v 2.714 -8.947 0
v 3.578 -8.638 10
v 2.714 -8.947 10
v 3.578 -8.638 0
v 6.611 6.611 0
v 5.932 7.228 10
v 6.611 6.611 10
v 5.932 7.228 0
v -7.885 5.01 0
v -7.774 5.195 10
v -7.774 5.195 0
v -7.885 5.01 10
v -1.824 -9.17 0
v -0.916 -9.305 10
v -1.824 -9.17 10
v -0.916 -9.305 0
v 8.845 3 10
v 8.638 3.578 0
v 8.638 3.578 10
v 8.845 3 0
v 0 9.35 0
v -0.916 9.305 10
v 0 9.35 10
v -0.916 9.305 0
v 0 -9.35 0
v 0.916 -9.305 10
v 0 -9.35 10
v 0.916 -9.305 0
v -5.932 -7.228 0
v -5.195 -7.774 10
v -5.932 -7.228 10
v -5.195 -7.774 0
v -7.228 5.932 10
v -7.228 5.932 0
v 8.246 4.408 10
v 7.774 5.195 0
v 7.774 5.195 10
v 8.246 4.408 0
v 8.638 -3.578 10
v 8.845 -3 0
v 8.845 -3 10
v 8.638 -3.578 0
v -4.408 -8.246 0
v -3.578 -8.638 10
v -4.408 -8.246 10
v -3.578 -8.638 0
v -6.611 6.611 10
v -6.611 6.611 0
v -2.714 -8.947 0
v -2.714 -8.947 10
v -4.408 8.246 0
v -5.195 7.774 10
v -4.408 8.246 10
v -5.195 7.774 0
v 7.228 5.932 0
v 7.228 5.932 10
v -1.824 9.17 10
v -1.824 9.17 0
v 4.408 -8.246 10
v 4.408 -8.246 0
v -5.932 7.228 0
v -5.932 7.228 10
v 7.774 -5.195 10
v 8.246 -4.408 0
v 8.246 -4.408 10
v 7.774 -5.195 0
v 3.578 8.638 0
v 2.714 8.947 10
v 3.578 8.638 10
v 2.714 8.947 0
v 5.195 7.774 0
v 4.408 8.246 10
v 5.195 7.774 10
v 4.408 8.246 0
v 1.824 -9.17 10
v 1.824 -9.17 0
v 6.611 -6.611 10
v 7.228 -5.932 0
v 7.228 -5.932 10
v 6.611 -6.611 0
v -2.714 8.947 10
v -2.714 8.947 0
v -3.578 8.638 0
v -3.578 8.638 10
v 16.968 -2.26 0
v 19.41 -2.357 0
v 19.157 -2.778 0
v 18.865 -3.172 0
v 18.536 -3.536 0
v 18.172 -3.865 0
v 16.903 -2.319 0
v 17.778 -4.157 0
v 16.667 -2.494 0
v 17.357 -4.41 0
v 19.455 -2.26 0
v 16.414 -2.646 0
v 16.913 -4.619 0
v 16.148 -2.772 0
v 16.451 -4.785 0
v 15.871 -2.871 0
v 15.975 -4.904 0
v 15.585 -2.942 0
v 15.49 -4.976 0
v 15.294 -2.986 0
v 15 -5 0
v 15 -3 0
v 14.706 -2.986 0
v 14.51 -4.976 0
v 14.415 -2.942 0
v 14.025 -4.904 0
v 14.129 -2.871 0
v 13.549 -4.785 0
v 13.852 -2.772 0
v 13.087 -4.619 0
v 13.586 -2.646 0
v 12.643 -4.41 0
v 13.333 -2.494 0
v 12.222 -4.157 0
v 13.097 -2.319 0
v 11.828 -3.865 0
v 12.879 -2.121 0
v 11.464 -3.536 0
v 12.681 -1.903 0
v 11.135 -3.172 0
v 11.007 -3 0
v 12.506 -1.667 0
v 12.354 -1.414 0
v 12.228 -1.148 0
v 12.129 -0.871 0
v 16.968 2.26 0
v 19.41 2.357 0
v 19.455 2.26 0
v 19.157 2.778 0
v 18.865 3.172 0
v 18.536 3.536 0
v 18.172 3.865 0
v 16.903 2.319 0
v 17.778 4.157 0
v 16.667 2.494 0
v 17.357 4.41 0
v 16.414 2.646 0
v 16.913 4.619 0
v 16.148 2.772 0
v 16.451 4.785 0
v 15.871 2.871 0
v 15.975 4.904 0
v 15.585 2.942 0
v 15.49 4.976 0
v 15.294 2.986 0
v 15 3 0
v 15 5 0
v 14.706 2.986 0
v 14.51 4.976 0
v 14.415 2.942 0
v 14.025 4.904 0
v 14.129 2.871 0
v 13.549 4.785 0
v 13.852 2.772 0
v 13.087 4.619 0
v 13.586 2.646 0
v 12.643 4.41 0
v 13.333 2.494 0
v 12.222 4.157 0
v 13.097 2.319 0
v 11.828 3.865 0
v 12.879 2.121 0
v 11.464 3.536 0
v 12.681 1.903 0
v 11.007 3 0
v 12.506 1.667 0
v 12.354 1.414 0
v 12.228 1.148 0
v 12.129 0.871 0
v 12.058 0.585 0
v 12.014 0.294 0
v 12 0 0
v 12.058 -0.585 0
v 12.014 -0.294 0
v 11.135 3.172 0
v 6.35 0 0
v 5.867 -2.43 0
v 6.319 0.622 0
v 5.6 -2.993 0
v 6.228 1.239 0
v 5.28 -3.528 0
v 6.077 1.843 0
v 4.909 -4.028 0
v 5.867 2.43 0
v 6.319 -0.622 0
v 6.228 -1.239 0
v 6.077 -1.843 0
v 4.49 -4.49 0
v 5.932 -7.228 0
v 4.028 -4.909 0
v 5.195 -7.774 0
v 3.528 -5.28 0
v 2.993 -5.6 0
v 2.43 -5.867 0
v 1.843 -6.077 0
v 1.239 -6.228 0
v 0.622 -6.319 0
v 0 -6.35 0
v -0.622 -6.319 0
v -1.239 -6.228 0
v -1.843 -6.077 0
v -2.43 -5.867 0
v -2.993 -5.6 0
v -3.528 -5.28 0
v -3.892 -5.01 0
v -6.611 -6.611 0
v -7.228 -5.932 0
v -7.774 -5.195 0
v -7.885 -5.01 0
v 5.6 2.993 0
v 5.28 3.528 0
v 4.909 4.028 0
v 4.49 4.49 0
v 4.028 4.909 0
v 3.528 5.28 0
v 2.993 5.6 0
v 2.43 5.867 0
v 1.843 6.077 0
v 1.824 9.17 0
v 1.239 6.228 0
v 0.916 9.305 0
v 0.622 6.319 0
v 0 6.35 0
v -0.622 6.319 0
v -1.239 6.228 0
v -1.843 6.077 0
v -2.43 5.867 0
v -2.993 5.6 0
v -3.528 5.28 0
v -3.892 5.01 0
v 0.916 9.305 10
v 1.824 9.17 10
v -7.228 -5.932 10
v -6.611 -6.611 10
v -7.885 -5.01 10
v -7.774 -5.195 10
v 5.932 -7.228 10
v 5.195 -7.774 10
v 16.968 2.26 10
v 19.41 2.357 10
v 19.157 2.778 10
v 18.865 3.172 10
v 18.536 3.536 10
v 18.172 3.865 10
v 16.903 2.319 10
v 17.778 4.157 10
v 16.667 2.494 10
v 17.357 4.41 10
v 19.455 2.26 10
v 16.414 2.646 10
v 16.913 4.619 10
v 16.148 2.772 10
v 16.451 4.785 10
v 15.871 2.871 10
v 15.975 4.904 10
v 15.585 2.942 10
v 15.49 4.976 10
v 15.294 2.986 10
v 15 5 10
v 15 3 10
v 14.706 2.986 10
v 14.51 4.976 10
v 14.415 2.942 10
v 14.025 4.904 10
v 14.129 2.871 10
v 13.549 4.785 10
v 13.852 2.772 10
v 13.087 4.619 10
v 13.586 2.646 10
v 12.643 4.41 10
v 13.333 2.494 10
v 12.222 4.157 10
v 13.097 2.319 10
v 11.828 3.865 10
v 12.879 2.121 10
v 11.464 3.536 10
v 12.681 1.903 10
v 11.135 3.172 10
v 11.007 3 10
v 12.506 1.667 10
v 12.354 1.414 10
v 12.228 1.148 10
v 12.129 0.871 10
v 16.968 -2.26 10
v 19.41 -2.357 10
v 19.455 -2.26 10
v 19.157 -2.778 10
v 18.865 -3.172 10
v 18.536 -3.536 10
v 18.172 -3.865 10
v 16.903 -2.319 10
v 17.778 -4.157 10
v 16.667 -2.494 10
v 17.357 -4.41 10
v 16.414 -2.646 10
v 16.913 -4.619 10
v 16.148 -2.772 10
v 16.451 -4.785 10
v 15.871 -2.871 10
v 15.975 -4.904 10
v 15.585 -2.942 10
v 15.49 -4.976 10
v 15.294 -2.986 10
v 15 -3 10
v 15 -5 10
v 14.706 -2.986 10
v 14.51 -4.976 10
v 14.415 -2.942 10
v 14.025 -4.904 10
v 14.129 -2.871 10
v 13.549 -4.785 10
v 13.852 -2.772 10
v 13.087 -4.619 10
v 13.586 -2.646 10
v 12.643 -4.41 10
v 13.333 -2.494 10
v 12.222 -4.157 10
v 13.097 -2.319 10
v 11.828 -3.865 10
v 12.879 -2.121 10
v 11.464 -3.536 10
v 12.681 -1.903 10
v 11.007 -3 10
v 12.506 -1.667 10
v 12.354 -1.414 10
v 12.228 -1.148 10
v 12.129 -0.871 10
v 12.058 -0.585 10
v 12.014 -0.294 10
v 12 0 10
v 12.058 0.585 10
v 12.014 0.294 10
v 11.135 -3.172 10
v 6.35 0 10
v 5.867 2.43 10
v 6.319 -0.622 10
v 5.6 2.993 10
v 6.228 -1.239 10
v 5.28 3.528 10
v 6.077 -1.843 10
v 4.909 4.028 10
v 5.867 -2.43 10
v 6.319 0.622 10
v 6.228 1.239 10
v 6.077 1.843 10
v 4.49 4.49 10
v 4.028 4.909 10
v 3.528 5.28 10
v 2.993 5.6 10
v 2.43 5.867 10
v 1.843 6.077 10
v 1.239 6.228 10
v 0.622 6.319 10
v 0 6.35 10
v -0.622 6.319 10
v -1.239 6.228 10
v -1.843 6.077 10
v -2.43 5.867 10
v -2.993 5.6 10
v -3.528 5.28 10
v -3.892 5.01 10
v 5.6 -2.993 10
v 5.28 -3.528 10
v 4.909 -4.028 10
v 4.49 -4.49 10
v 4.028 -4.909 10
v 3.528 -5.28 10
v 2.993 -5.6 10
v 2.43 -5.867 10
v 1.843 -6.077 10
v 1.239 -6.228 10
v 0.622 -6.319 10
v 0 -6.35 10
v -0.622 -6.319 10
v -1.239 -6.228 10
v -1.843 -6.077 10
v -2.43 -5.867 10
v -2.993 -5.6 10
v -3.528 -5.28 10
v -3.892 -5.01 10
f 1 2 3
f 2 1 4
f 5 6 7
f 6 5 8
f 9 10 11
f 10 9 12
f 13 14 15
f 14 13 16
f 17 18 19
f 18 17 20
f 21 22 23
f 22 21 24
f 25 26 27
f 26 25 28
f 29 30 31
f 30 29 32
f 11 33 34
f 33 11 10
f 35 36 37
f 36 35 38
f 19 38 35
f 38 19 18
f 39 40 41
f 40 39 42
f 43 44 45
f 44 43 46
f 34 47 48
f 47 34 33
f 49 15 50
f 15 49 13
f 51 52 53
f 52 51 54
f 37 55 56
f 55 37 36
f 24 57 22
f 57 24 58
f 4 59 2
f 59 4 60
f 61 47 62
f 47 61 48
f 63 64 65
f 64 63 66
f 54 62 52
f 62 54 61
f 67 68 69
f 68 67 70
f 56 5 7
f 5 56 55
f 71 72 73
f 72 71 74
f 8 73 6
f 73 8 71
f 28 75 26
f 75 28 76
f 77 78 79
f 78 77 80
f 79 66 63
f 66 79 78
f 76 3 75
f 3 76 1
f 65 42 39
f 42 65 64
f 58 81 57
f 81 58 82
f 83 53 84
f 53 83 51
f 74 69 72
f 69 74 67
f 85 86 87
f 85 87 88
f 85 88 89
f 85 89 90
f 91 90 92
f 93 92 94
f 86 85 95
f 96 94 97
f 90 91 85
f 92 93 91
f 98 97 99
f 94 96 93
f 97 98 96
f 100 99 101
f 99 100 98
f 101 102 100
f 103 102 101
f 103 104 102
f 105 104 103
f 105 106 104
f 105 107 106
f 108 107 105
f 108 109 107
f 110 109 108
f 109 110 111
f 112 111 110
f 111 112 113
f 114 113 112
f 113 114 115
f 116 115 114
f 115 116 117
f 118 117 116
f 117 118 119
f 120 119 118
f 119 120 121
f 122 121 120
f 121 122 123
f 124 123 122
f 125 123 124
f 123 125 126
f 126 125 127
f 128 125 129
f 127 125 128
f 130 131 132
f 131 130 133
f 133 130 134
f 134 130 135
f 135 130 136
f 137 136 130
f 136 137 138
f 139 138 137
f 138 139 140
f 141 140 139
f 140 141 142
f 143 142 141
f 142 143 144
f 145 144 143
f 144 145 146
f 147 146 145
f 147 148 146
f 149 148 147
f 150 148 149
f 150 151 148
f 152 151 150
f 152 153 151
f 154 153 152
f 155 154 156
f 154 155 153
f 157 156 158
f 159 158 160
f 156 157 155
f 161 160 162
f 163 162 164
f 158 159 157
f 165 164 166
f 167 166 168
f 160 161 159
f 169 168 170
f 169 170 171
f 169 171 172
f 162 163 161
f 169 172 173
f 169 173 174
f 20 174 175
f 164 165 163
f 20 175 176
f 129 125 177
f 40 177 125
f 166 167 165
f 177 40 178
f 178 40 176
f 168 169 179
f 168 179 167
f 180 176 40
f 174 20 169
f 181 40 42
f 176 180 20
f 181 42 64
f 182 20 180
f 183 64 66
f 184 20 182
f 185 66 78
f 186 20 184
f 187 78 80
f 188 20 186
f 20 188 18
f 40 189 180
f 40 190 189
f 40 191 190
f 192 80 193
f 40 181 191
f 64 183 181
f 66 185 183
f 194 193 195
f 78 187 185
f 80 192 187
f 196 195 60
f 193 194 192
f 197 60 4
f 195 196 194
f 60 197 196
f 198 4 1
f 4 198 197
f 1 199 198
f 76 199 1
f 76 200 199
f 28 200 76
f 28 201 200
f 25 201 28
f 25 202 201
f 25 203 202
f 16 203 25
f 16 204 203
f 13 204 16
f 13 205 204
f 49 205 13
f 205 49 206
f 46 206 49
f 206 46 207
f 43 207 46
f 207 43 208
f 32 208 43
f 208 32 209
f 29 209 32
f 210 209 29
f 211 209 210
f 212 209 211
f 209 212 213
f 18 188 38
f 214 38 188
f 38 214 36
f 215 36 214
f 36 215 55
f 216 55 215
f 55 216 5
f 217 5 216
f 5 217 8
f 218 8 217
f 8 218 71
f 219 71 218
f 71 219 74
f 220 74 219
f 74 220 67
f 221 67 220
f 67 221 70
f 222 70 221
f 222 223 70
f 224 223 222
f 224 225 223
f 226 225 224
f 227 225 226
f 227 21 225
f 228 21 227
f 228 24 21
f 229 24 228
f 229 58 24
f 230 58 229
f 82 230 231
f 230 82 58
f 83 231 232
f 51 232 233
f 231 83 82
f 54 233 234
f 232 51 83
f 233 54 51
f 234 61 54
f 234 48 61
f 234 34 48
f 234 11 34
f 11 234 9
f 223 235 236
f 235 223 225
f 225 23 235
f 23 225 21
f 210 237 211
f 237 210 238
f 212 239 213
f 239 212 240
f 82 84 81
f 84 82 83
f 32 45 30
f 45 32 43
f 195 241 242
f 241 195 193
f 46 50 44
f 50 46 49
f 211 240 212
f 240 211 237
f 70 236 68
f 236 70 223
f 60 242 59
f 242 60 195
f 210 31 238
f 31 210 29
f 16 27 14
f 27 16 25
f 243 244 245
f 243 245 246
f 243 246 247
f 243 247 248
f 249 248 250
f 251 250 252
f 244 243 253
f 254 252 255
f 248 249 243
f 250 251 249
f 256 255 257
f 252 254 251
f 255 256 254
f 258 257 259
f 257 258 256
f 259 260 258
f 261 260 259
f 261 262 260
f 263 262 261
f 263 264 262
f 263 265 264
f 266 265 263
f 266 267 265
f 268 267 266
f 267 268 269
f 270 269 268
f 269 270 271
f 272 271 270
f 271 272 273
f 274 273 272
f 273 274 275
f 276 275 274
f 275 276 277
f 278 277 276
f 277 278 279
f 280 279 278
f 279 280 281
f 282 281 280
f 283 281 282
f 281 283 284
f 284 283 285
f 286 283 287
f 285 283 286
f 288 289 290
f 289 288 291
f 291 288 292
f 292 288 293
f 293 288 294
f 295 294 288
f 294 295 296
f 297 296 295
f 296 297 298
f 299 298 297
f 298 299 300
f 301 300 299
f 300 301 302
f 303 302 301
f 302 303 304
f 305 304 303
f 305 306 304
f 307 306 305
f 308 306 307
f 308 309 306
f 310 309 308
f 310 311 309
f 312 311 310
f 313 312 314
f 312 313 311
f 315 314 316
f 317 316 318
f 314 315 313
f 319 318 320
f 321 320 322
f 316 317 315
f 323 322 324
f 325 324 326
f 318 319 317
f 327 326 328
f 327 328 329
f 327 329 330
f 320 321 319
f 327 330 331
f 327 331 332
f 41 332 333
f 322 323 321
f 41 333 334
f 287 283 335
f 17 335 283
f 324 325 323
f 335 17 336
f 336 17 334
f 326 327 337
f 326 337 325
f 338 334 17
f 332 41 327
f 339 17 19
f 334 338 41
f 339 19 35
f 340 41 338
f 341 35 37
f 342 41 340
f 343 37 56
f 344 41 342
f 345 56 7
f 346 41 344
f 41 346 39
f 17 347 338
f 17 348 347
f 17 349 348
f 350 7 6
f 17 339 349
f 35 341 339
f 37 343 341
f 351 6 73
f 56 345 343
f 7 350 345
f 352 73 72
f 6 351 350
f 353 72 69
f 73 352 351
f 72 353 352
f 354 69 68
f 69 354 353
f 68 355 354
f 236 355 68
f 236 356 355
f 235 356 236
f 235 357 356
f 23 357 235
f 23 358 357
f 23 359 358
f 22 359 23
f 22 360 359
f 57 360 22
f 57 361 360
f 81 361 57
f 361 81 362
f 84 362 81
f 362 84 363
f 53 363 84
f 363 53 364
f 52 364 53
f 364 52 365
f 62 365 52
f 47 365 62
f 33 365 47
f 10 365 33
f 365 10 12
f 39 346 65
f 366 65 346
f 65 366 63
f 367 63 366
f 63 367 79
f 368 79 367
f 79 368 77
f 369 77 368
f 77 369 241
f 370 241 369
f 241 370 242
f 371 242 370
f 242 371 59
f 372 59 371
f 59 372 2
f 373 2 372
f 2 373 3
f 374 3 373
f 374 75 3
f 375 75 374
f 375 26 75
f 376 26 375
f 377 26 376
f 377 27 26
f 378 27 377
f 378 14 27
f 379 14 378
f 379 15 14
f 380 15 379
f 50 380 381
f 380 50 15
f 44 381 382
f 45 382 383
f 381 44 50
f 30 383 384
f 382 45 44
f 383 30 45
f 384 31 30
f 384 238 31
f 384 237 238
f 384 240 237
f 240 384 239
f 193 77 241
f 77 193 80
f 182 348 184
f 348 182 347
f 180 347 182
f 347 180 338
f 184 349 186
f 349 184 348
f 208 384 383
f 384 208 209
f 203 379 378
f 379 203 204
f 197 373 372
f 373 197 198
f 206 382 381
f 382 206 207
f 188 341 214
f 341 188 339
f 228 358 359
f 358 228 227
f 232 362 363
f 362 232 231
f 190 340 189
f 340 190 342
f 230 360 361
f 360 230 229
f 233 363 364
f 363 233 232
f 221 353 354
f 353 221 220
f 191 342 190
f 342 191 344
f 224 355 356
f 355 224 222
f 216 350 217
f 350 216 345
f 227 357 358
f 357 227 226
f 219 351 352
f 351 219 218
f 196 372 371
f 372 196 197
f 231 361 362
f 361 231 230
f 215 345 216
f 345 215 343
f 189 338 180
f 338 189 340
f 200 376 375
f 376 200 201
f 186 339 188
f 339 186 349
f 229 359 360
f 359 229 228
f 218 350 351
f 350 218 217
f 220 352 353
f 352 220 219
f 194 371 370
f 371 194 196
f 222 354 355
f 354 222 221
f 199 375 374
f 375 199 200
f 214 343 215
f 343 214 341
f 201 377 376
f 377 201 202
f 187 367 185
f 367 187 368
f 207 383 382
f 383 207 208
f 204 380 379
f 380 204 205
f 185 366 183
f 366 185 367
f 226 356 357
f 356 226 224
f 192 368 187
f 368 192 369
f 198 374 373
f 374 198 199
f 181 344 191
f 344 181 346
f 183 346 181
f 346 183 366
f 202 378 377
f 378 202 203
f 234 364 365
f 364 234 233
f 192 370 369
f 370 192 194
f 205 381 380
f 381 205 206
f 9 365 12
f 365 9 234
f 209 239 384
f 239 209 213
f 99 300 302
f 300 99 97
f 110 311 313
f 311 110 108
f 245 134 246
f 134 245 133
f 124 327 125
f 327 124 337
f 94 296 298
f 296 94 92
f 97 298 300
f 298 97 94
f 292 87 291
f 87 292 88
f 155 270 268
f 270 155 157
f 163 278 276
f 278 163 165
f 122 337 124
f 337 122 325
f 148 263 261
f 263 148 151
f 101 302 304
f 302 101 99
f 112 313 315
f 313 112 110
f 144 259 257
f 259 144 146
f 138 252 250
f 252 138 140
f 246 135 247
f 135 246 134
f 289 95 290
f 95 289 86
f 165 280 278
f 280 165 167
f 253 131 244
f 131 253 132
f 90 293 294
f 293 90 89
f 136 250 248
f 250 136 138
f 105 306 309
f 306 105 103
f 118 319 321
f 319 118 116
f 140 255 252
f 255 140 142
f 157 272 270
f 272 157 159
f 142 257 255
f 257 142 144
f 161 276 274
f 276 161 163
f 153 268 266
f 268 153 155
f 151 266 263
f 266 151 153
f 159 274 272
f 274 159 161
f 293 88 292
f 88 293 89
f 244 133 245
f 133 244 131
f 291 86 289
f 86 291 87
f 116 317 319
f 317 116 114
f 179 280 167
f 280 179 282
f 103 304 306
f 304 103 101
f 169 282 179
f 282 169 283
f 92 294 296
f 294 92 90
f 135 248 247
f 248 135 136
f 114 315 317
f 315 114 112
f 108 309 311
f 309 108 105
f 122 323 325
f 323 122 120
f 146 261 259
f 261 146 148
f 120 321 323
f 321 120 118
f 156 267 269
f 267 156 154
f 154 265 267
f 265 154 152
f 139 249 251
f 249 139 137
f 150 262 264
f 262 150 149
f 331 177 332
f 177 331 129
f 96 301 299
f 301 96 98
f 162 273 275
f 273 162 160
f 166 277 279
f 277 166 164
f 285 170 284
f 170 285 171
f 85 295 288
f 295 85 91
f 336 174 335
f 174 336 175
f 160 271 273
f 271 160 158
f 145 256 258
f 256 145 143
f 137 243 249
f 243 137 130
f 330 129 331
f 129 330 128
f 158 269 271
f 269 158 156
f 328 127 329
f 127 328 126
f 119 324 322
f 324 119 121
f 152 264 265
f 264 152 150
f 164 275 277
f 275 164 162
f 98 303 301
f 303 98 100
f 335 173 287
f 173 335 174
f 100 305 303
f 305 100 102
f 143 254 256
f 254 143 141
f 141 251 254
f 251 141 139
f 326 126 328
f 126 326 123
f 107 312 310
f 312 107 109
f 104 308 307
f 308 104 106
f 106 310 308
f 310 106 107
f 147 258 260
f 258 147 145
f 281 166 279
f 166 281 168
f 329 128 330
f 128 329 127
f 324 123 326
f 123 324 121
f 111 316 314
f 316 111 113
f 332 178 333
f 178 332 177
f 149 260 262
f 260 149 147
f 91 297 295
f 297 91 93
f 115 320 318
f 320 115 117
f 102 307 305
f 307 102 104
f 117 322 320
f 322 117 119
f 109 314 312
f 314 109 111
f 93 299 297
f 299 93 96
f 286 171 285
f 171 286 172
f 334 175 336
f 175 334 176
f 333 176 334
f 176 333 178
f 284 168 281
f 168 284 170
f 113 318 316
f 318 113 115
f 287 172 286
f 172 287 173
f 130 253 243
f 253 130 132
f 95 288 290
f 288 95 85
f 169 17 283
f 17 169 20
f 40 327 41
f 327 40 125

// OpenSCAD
// --- Dimensions ---
rod_inner_dia = 12.7;      // Inner diameter of the rod ring (mm)
rod_wall = 3.0;            // Wall thickness of the rod ring (mm)
rod_opening_width = 10.0;  // Width of the gap in the rod ring (mm)
rod_opening_height = 10.0; // Height of the gap in the rod ring (mm)
rod_extrusion_z = 10.0;    // Total height of the part (Z) (mm)

tube_inner_dia = 6.0;      // Inner diameter of the tubing ring (mm)
tube_wall = 2.0;           // Wall thickness of the tubing ring (mm)
tube_opening_width = 4.5;  // Width of the gap in the tubing ring (mm)
tube_opening_height = 10.0; // Height of the gap in the tubing ring (mm)
tube_offset_x = 15.0;      // X-offset for the tubing ring center (mm)

bridge_width_y = 6.0;      // Width of the bridge along the Y axis (mm)
bridge_x_start = 8.0;       // Start of the bridge along X axis (mm)
bridge_x_end = 12.0;        // End of the bridge along X axis (mm)

// --- Constants ---
$fn = 64;

// --- Calculations ---
rod_outer_dia = rod_inner_dia + (2 * rod_wall);
tube_outer_dia = tube_inner_dia + (2 * tube_wall);

// --- Main Construction ---
// The part is built from Z=0 upwards. 
// To ensure the part rests on the XY plane at Z=0, we do not use center=true for the extrusion.
// Instead, we translate the cylinders so their base is at Z=0.

union() {
    // 1. The Rod Ring
    difference() {
        // Outer cylinder (Base at Z=0)
        cylinder(h = rod_extrusion_z, d = rod_outer_dia);
        
        // Inner hole (Rod)
        // We use a slightly larger height to ensure a clean cut through the top/bottom
        translate([0, 0, -0.01])
            cylinder(h = rod_extrusion_z + 0.02, d = rod_inner_dia);
        
        // Rod Opening (cut from -X side)
        // Prompt: "everything with x < 0 and -5 < y < 5 is removed"
        // We use a large cube to ensure it cuts through the entire ring.
        translate([-rod_outer_dia - 1, -5.01, -0.01])
            cube([rod_outer_dia + 2, 10.02, rod_extrusion_z + 0.02]);
    }

    // 2. The Tubing Ring
    difference() {
        // Outer cylinder (Base at Z=0)
        translate([tube_offset_x, 0, 0])
            cylinder(h = rod_extrusion_z, d = tube_outer_dia);
        
        // Inner hole (Tube)
        translate([tube_offset_x, 0, 0])
            cylinder(h = rod_extrusion_z + 0.02, d = tube_inner_dia);
        
        // Tubing Opening (cut from +X side)
        // Prompt: "x > 15 and -2.25 < y < 2.25 is removed"
        // We use a large cube to ensure it cuts through the entire ring.
        translate([tube_offset_x + 0.01, -2.26, -0.01])
            cube([tube_outer_dia + 1, 4.52, rod_extrusion_z + 0.02]);
    }

    // 3. The Solid Bridge
    // Prompt: "6 mm wide (Y) between x = 8 and x = 12"
    // This joins the two rings.
    translate([bridge_x_start, -bridge_width_y/2, 0])
        cube([bridge_x_end - bridge_x_start, bridge_width_y, rod_extrusion_z]);
}

// Final check: The part is centered on X and Y. 
// The rod ring is at (0,0), tube ring is at (15,0).
// The bridge is at x=8 to 12.
// The rod ring outer diameter is 18.7, so it spans X from -9.35 to 9.35.
// The tube ring outer diameter is 10, so it spans X from 10 to 20.
// The bridge (8 to 12) connects them.
